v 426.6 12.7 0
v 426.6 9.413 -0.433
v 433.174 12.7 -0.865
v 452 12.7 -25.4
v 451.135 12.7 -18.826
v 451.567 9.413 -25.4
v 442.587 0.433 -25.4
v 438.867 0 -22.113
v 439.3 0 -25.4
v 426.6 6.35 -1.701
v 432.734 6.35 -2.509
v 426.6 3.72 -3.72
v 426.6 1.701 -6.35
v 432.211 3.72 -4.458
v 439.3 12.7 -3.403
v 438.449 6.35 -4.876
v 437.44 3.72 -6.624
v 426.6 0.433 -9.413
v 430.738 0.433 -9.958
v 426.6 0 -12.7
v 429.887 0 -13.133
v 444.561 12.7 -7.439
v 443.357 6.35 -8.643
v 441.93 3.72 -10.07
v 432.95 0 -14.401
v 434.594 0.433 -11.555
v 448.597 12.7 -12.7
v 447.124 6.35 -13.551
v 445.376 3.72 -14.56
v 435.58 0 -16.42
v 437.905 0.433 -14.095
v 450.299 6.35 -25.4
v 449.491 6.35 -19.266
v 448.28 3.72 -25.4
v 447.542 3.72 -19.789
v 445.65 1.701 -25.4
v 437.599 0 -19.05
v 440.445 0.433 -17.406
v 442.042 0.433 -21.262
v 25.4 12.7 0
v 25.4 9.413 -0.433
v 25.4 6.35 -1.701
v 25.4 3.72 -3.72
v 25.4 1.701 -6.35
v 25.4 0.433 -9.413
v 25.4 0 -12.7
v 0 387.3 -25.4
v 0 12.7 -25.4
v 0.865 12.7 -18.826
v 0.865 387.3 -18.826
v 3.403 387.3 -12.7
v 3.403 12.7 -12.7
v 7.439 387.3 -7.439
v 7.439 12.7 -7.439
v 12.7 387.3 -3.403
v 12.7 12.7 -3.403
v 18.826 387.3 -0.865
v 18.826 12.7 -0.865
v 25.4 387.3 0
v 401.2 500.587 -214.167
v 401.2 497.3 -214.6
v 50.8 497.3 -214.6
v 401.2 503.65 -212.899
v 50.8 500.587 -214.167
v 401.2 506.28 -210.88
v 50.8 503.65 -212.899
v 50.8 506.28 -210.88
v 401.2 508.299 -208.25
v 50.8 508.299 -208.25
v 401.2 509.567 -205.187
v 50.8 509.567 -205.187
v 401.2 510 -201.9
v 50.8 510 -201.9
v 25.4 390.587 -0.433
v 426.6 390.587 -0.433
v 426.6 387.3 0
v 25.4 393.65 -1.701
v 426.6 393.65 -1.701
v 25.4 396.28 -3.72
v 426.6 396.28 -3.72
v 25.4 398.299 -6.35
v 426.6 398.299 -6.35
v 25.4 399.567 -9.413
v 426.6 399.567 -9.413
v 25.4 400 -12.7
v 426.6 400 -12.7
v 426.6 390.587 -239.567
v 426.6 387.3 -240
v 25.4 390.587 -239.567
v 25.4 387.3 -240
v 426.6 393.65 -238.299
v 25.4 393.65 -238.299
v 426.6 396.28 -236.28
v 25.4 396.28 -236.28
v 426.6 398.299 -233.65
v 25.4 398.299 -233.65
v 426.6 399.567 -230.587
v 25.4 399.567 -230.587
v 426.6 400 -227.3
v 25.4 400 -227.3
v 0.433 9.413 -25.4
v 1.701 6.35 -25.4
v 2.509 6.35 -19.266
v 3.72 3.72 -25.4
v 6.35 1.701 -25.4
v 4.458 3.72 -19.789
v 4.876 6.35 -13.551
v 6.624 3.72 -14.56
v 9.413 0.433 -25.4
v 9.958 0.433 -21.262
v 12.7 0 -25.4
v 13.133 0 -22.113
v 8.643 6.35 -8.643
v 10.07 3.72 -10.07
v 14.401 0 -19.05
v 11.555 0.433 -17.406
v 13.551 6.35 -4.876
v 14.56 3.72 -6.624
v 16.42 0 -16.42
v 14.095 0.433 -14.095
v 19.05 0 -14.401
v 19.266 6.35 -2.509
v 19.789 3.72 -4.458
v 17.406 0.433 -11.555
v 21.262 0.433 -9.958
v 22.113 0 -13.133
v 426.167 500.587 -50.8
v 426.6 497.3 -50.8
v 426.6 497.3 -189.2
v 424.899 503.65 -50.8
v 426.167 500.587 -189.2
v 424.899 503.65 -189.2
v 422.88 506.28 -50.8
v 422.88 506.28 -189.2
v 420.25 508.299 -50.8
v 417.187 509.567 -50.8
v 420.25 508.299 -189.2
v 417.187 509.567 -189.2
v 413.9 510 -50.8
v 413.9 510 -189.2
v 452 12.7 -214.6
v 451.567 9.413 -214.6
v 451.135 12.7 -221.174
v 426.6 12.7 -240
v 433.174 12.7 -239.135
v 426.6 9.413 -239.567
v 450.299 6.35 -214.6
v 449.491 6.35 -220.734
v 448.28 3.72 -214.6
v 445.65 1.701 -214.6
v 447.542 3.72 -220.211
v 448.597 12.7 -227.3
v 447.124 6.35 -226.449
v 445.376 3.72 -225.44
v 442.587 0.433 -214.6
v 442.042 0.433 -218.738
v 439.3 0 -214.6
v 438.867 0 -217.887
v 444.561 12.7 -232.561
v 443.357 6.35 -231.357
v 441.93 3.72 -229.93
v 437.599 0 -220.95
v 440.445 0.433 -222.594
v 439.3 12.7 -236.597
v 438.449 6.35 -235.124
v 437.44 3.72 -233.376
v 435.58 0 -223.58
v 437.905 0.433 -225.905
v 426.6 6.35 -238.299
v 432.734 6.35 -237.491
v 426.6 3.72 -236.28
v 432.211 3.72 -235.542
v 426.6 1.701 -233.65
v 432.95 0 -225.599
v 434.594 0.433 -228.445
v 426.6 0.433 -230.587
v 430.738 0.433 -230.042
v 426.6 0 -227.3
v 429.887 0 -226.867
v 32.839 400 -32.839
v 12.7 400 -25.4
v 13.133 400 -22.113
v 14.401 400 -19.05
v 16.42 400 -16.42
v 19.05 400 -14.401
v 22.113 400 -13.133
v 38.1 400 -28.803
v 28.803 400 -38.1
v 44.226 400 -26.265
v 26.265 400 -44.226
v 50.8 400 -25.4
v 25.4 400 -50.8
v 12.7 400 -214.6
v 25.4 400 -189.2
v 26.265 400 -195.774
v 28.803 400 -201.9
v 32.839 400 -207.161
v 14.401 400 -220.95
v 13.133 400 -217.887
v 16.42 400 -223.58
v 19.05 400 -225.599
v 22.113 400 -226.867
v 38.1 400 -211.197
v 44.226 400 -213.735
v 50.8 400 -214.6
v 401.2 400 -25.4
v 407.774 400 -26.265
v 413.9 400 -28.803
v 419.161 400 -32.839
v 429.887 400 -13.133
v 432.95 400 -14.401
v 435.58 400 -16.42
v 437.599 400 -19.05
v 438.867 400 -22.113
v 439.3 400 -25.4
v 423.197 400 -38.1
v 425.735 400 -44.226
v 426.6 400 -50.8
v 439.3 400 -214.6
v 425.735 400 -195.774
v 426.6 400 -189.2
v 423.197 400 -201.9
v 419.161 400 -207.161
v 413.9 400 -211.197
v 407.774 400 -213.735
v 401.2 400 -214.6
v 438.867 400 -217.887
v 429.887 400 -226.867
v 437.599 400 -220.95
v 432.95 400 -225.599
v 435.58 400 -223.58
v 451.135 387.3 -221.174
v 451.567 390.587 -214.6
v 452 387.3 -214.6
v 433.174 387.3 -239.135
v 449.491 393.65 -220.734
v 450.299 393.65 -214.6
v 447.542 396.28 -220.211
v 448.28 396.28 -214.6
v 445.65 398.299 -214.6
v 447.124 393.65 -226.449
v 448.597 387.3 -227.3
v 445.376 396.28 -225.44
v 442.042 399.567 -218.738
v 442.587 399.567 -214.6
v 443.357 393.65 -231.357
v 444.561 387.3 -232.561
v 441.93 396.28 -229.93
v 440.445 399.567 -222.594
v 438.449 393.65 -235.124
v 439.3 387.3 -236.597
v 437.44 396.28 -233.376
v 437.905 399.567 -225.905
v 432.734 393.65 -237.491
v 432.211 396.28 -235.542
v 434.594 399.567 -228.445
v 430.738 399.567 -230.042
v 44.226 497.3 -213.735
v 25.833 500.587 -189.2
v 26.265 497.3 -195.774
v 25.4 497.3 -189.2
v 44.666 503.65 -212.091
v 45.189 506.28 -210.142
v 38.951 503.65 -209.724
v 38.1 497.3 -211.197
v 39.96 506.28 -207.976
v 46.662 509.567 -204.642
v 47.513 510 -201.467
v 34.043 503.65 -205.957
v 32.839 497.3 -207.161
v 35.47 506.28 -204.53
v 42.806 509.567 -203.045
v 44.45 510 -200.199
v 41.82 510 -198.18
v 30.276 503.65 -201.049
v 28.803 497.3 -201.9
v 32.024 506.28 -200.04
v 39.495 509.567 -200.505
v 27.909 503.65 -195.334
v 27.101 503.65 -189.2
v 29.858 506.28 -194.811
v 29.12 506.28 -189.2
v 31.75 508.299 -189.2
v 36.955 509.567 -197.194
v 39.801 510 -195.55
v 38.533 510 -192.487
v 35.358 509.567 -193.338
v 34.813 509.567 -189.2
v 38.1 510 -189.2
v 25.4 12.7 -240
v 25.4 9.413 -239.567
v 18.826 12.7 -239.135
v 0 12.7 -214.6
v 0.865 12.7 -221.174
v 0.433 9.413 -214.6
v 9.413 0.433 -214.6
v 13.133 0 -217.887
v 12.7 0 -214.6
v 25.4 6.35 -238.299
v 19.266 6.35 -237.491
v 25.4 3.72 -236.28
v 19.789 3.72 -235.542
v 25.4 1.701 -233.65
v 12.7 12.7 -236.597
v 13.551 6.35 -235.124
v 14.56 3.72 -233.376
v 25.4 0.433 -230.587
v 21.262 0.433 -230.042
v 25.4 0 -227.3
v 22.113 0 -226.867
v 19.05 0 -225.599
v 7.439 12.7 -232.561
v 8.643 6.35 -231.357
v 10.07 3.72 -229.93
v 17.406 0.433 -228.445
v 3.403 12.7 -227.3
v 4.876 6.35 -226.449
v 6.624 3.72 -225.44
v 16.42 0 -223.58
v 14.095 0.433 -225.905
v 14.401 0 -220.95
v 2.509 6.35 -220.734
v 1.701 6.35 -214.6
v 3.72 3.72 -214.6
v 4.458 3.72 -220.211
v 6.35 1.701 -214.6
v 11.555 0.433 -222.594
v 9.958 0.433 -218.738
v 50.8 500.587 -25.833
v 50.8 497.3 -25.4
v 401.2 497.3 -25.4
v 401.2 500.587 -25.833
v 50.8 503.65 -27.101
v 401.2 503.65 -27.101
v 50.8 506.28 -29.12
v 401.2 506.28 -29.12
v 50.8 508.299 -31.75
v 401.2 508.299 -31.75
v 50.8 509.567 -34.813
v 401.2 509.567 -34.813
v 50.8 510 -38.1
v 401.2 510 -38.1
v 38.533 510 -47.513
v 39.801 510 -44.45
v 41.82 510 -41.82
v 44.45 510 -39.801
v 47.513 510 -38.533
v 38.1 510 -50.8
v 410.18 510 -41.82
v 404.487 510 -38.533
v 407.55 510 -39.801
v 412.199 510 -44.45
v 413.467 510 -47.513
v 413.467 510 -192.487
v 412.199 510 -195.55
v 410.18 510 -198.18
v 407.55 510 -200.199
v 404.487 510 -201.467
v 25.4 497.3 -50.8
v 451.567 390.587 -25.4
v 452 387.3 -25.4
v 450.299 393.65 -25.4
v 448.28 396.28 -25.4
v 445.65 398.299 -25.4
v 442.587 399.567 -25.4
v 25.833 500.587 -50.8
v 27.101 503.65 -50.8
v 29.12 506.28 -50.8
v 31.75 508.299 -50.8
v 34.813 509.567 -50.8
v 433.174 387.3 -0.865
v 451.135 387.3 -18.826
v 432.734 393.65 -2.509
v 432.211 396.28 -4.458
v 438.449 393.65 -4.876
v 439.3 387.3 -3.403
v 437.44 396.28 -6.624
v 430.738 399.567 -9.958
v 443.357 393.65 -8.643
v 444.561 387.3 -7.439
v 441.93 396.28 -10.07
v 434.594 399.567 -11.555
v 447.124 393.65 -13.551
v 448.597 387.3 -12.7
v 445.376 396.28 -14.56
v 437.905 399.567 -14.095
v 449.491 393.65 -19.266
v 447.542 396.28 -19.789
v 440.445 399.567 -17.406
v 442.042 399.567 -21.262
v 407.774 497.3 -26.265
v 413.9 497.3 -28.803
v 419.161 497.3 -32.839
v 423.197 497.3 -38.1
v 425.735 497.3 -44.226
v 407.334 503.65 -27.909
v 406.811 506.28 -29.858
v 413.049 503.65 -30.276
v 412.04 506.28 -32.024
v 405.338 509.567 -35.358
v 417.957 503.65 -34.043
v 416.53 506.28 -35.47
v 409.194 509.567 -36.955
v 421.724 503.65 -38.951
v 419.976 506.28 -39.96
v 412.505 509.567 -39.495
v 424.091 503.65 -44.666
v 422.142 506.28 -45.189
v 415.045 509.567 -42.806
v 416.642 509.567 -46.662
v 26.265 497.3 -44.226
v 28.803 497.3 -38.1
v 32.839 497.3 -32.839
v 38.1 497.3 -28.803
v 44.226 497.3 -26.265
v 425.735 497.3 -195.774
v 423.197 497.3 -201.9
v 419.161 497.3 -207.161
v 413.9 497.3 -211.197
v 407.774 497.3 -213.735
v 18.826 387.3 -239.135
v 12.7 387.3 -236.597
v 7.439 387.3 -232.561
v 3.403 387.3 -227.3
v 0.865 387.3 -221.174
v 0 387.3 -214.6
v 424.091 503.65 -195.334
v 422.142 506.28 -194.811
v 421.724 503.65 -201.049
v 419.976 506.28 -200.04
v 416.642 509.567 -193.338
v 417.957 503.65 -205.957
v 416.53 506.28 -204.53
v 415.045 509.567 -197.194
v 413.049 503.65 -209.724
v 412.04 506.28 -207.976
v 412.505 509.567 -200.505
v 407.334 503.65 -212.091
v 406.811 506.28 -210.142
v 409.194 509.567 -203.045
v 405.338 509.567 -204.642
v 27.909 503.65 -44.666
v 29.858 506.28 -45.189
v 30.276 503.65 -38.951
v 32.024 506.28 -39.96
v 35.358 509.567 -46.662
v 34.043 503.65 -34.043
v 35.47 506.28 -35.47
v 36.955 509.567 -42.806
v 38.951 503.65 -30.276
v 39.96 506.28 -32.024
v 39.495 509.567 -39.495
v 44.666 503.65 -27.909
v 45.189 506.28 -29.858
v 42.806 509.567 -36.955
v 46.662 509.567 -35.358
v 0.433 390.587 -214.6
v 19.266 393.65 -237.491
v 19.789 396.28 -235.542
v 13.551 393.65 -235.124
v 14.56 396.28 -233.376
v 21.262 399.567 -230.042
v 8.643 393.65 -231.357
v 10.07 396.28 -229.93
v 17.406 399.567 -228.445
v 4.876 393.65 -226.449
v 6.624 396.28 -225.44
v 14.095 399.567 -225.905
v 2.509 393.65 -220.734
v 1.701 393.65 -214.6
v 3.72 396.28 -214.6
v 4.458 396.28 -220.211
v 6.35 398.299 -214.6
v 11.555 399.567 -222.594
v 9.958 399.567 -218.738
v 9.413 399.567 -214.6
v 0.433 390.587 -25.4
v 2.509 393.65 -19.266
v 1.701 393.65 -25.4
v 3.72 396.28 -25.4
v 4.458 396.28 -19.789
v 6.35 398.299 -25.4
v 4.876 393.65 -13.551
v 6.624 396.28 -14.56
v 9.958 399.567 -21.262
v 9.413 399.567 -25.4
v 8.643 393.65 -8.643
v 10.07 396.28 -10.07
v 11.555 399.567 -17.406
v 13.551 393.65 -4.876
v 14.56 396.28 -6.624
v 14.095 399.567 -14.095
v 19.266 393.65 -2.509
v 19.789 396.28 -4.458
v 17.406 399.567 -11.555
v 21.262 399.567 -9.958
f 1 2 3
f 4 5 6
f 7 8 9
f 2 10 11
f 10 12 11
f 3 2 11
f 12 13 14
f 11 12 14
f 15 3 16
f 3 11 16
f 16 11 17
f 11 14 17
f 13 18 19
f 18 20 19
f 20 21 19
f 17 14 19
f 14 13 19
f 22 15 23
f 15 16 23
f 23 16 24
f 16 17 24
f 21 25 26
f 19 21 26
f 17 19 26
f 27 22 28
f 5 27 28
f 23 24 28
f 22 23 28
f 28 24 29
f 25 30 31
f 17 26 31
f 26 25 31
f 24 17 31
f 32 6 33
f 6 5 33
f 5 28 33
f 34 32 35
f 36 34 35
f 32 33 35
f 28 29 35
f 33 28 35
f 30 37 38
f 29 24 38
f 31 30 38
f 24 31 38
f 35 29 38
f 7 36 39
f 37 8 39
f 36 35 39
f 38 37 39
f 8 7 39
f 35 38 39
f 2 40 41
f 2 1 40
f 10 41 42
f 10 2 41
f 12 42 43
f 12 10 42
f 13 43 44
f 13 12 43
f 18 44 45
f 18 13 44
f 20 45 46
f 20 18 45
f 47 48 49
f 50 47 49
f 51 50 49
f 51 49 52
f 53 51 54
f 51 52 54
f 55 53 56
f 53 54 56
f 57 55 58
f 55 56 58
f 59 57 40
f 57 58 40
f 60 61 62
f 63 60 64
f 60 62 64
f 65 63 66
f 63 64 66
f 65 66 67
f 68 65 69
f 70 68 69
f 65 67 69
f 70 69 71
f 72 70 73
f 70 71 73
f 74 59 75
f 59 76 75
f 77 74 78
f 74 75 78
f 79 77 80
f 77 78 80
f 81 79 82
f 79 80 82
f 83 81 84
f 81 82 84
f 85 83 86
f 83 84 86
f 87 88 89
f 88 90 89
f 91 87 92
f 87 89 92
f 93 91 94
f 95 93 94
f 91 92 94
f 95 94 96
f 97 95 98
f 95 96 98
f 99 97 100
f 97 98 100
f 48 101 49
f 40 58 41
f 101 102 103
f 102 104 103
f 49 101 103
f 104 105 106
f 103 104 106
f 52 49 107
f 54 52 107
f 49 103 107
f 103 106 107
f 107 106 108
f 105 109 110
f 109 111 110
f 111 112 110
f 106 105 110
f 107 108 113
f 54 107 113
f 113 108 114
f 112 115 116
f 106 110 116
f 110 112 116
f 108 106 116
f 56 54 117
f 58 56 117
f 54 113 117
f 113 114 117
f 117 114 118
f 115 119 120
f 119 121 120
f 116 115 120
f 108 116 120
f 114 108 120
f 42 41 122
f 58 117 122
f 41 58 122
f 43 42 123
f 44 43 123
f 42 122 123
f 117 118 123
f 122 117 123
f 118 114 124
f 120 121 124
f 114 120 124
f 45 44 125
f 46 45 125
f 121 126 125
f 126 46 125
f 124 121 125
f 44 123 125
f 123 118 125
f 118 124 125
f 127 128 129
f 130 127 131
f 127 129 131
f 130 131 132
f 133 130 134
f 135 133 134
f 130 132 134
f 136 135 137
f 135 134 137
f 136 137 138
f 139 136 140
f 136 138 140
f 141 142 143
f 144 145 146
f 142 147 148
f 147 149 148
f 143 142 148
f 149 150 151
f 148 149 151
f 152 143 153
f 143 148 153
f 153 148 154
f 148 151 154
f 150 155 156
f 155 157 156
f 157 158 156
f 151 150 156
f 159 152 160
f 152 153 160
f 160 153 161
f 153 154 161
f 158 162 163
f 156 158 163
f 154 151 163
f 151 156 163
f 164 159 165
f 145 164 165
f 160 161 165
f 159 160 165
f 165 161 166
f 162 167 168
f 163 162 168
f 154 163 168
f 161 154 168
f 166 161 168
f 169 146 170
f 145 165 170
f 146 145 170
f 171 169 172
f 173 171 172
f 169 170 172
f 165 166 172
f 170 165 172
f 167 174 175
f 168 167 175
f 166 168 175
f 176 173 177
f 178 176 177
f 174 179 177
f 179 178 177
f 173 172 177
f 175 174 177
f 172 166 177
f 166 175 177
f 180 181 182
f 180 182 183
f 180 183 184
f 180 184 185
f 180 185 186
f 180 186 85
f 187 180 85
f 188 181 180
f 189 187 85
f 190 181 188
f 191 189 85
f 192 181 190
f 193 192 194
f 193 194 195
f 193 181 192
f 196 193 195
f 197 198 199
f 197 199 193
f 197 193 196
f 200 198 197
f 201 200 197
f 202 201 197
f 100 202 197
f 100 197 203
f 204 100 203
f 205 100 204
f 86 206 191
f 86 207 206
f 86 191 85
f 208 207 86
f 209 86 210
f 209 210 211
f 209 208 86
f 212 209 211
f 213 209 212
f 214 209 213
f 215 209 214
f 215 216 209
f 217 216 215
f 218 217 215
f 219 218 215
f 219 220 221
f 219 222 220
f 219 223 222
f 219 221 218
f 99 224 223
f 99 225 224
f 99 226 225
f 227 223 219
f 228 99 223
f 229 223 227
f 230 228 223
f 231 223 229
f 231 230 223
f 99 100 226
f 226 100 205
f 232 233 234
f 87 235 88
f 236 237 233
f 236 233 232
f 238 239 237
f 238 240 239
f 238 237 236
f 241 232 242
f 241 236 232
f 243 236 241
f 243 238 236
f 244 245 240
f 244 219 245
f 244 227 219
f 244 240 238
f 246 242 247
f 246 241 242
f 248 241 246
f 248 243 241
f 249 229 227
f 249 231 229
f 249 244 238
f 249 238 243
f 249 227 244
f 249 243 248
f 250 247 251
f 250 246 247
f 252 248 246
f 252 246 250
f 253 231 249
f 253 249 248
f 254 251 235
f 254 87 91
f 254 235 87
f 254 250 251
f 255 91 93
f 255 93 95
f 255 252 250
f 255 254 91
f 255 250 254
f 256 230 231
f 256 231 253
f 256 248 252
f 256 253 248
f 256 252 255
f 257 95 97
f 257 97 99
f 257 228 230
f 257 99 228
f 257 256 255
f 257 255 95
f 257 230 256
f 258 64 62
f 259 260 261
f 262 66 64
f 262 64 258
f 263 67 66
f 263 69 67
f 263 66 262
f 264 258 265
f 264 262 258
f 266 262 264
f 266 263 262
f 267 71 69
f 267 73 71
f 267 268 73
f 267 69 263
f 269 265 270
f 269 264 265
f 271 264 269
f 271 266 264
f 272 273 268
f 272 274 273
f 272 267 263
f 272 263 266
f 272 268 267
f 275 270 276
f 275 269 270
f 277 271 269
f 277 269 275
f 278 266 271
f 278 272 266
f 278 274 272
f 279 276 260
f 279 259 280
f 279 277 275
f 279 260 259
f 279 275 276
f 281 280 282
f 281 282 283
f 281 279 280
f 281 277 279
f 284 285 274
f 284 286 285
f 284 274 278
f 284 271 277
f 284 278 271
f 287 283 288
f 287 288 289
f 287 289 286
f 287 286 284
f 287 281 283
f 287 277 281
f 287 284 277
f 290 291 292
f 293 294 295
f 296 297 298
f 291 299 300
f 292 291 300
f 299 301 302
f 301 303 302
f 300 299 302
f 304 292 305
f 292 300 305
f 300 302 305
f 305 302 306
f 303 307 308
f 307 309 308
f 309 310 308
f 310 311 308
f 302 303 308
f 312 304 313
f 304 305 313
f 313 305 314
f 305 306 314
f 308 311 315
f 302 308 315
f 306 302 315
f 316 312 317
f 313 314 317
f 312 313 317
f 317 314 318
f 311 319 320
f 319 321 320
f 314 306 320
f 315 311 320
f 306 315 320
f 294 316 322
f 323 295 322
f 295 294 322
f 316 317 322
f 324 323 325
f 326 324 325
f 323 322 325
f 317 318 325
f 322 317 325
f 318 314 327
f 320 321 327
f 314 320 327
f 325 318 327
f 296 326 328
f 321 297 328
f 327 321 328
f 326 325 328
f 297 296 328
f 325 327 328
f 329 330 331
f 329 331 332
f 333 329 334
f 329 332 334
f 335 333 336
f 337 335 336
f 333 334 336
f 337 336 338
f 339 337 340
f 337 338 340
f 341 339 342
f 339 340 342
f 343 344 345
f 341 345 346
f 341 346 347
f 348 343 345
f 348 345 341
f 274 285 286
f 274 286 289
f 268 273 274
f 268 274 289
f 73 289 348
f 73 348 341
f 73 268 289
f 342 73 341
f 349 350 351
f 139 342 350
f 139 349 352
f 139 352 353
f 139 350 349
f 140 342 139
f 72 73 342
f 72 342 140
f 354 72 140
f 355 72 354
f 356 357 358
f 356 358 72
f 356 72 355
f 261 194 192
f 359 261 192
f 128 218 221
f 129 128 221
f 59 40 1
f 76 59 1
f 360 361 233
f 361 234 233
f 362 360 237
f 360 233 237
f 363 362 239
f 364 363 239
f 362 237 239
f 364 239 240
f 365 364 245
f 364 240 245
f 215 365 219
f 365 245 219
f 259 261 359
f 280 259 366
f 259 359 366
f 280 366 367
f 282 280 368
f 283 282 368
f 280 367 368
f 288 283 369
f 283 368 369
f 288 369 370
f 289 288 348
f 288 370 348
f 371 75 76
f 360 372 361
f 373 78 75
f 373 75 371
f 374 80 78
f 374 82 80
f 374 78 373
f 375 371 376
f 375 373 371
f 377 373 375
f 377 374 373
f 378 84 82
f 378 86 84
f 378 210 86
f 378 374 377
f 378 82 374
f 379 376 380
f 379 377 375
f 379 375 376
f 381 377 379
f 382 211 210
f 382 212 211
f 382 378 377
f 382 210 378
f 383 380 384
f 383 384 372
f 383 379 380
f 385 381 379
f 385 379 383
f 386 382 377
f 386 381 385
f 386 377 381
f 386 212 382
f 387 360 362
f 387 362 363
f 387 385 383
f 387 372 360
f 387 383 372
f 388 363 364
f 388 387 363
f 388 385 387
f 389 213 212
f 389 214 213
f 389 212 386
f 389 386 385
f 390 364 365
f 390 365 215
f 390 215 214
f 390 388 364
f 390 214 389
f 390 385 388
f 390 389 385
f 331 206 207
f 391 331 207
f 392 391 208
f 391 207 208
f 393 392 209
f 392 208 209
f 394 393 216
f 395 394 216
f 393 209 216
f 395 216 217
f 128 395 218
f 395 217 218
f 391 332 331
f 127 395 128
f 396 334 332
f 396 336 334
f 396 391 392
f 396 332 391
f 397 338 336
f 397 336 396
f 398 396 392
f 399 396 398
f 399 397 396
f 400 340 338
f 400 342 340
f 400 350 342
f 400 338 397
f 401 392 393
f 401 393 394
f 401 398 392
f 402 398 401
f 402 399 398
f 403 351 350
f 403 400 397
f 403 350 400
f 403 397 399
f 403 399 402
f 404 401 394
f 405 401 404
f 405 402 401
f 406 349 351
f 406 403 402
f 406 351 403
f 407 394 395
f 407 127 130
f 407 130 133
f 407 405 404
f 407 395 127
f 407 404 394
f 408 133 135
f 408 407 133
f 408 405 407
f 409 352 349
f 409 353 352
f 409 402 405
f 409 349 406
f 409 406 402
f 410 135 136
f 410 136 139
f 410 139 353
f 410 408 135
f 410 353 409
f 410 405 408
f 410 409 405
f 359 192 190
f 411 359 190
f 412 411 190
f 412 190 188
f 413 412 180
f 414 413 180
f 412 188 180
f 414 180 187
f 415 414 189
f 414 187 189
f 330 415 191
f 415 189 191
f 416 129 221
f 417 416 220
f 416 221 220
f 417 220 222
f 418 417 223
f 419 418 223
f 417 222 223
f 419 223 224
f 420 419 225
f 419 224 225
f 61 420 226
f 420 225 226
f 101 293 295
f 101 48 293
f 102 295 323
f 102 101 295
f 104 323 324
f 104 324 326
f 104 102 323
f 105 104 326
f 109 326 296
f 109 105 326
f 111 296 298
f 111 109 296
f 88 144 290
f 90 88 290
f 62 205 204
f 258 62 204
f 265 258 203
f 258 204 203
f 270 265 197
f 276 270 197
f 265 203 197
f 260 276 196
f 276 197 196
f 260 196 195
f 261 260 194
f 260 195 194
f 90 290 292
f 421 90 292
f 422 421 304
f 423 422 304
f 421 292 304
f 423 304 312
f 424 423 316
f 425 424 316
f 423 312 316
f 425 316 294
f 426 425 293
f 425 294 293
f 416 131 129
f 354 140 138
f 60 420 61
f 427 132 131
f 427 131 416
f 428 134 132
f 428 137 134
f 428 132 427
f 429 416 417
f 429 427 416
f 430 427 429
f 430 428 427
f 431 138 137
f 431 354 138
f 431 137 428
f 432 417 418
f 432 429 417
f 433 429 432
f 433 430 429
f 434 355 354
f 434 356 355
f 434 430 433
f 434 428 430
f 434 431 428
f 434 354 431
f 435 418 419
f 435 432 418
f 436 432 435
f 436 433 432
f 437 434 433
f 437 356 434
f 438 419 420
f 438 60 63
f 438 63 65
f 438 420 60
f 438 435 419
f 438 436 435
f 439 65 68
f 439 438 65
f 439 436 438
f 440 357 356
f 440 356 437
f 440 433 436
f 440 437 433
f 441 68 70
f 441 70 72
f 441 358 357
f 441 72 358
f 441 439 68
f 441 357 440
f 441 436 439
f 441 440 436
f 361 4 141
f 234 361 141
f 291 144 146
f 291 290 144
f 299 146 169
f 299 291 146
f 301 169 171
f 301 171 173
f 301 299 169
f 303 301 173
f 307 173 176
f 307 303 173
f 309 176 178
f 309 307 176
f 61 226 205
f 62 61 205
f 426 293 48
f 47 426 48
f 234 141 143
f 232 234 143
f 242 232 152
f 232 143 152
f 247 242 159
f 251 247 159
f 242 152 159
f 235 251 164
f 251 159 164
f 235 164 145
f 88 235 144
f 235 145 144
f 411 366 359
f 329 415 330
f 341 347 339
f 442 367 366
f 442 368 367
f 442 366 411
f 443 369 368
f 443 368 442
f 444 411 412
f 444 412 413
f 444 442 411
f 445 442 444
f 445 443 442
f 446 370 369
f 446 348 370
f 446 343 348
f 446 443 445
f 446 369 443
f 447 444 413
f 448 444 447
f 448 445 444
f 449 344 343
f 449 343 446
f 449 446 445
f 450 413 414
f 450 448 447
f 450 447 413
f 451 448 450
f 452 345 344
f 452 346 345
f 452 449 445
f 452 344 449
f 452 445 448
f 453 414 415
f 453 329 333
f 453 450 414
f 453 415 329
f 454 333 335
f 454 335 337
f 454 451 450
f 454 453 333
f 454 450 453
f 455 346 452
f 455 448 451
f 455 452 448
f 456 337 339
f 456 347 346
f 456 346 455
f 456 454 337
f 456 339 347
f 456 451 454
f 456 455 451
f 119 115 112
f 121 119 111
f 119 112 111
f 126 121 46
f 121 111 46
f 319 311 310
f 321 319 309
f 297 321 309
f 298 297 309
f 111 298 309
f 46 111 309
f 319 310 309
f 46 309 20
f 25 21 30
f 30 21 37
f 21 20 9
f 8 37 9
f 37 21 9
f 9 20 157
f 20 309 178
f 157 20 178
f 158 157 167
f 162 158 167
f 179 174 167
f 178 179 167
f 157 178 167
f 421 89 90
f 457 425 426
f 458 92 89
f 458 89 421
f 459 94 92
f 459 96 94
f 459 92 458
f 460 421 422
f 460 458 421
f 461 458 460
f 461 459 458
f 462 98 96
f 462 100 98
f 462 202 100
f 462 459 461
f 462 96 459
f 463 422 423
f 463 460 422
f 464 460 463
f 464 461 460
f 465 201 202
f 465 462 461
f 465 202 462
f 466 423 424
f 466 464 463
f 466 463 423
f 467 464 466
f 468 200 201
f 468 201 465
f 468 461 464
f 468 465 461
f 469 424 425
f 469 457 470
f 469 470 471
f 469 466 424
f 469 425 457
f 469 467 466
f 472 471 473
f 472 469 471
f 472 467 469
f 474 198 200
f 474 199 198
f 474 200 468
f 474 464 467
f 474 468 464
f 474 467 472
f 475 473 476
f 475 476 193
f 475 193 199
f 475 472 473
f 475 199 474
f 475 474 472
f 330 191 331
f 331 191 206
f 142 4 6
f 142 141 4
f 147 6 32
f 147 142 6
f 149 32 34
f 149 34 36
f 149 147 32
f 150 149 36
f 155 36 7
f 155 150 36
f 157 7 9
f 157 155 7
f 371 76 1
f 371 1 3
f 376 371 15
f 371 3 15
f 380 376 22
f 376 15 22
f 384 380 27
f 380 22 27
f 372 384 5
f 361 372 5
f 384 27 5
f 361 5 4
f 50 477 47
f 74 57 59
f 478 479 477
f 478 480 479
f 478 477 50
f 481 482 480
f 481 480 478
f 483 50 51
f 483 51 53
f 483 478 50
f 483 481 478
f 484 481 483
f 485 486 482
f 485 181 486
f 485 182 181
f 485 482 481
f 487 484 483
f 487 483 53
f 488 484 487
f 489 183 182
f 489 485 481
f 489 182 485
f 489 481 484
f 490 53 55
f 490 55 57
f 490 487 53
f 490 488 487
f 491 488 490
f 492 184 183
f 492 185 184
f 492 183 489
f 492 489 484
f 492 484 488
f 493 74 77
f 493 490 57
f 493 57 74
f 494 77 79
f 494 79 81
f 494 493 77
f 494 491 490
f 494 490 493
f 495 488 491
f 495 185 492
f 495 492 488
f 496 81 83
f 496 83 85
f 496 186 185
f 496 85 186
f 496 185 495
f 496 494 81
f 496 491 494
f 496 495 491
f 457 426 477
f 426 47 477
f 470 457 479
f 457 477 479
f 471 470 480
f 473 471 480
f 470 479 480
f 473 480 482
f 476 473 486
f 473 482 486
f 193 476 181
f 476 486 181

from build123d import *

# Parameters (mm, degrees)
BOSS_EXTRUDE1_DEPTH = 400
FILLET1_R           = 12.7
BOSS_EXTRUDE3_DEPTH = 110
FILLET2_R           = 12.7


with BuildPart() as part:
    # Sketch1 → Boss-Extrude1 (new body)
    with BuildSketch(Plane(origin=(0, 0, 0), x_dir=(1, 0, 0), z_dir=(0, 1, 0))):
        with BuildLine():
            Line((25.4, 0), (426.6, 0))
            ThreePointArc((426.6, 0), (444.560512242, 7.439487758), (452, 25.4))
            Line((452, 25.4), (452, 214.6))
            ThreePointArc((452, 214.6), (444.560512242, 232.560512242), (426.6, 240))
            Line((426.6, 240), (25.4, 240))
            ThreePointArc((25.4, 240), (7.439487758, 232.560512242), (0, 214.6))
            Line((0, 214.6), (0, 25.4))
            ThreePointArc((0, 25.4), (7.439487758, 7.439487758), (25.4, 0))
        make_face()
    extrude(amount=BOSS_EXTRUDE1_DEPTH)

    # Fillet1
    fillet1_edges = [part.edges().sort_by_distance(p)[0] for p in [
        (226, 0, 0),
        (7.439487758, 0, -7.439487758),
        (0, 0, -120),
        (7.439487758, 0, -232.560512242),
        (7.439487758, 400, -7.439487758),
        (226, 400, 0),
        (444.560512242, 400, -7.439487758),
        (452, 400, -120),
        (444.560512242, 400, -232.560512242),
        (226, 400, -240),
        (7.439487758, 400, -232.560512242),
        (226, 0, -240),
        (0, 400, -120),
        (444.560512242, 0, -232.560512242),
        (452, 0, -120),
        (444.560512242, 0, -7.439487758),
    ]]
    fillet(fillet1_edges, radius=FILLET1_R)

    # Sketch2 → Boss-Extrude3 (add)
    with BuildSketch(Plane(origin=(0, 400, 0), x_dir=(1, 0, 0), z_dir=(0, 1, 0))):
        with BuildLine():
            Line((50.8, 25.4), (401.2, 25.4))
            ThreePointArc((401.2, 25.4), (419.160512242, 32.839487758), (426.6, 50.8))
            Line((426.6, 50.8), (426.6, 189.2))
            ThreePointArc((426.6, 189.2), (419.160512242, 207.160512242), (401.2, 214.6))
            Line((401.2, 214.6), (50.8, 214.6))
            ThreePointArc((50.8, 214.6), (32.839487758, 207.160512242), (25.4, 189.2))
            Line((25.4, 189.2), (25.4, 50.8))
            ThreePointArc((25.4, 50.8), (32.839487758, 32.839487758), (50.8, 25.4))
        make_face()
    extrude(amount=BOSS_EXTRUDE3_DEPTH)

    # Fillet2
    fillet2_edges = [part.edges().sort_by_distance(p)[0] for p in [
        (419.160512242, 510, -207.160512242),
        (226, 510, -214.6),
        (32.839487758, 510, -207.160512242),
        (25.4, 510, -120),
        (32.839487758, 510, -32.839487758),
        (226, 510, -25.4),
        (419.160512242, 510, -32.839487758),
        (426.6, 510, -120),
    ]]
    fillet(fillet2_edges, radius=FILLET2_R)


solid = part.part
